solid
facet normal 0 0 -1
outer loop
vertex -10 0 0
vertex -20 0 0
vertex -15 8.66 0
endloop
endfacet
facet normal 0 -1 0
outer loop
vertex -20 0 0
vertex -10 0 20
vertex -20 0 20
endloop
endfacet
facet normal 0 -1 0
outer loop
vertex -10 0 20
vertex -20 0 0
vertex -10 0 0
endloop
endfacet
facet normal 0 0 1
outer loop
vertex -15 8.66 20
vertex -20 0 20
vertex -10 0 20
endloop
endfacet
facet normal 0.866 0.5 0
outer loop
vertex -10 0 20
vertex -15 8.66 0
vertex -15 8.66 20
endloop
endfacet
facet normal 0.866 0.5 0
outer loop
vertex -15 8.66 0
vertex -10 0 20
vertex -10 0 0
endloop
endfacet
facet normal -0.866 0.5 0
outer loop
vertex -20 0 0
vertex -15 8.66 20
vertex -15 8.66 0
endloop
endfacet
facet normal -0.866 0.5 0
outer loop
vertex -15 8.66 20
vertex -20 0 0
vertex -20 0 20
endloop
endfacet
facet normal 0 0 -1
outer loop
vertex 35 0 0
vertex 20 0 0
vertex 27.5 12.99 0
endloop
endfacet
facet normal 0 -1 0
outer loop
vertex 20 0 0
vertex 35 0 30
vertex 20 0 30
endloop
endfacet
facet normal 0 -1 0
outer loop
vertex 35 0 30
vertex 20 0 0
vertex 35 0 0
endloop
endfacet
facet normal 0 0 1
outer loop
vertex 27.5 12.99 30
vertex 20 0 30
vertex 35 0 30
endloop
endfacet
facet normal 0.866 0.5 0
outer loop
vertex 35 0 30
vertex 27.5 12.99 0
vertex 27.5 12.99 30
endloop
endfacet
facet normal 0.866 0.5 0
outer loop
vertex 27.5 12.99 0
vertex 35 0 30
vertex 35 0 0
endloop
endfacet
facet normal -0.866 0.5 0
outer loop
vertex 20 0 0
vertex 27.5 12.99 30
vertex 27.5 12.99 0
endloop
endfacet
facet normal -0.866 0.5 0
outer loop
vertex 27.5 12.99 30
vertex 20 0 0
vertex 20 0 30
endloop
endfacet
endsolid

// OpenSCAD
// file: ../../lib/shapes/prism.scad
// lib/shapes/prism.scad

/**
 * Creates a prism with the specified base side length and height.
 *
 * @param side_length The length of each side of the base.
 * @param height The height of the prism.
 */
module shapePrism(side_length = 10, height = 20) {
    base_points = [
        [0, 0],
        [side_length, 0],
        [side_length / 2, side_length * sqrt(3) / 2]
    ];
    linear_extrude(height = height)
        polygon(points = base_points);
}
// main file
// tests/shapes/test_prism.scad

use <../../lib/shapes/prism.scad>

module testPrism() {
    translate([-20, 0, 0])
    shapePrism(side_length = 10, height = 20);

    translate([20, 0, 0])
    shapePrism(side_length = 15, height = 30);
}

// Run tests
testPrism();
